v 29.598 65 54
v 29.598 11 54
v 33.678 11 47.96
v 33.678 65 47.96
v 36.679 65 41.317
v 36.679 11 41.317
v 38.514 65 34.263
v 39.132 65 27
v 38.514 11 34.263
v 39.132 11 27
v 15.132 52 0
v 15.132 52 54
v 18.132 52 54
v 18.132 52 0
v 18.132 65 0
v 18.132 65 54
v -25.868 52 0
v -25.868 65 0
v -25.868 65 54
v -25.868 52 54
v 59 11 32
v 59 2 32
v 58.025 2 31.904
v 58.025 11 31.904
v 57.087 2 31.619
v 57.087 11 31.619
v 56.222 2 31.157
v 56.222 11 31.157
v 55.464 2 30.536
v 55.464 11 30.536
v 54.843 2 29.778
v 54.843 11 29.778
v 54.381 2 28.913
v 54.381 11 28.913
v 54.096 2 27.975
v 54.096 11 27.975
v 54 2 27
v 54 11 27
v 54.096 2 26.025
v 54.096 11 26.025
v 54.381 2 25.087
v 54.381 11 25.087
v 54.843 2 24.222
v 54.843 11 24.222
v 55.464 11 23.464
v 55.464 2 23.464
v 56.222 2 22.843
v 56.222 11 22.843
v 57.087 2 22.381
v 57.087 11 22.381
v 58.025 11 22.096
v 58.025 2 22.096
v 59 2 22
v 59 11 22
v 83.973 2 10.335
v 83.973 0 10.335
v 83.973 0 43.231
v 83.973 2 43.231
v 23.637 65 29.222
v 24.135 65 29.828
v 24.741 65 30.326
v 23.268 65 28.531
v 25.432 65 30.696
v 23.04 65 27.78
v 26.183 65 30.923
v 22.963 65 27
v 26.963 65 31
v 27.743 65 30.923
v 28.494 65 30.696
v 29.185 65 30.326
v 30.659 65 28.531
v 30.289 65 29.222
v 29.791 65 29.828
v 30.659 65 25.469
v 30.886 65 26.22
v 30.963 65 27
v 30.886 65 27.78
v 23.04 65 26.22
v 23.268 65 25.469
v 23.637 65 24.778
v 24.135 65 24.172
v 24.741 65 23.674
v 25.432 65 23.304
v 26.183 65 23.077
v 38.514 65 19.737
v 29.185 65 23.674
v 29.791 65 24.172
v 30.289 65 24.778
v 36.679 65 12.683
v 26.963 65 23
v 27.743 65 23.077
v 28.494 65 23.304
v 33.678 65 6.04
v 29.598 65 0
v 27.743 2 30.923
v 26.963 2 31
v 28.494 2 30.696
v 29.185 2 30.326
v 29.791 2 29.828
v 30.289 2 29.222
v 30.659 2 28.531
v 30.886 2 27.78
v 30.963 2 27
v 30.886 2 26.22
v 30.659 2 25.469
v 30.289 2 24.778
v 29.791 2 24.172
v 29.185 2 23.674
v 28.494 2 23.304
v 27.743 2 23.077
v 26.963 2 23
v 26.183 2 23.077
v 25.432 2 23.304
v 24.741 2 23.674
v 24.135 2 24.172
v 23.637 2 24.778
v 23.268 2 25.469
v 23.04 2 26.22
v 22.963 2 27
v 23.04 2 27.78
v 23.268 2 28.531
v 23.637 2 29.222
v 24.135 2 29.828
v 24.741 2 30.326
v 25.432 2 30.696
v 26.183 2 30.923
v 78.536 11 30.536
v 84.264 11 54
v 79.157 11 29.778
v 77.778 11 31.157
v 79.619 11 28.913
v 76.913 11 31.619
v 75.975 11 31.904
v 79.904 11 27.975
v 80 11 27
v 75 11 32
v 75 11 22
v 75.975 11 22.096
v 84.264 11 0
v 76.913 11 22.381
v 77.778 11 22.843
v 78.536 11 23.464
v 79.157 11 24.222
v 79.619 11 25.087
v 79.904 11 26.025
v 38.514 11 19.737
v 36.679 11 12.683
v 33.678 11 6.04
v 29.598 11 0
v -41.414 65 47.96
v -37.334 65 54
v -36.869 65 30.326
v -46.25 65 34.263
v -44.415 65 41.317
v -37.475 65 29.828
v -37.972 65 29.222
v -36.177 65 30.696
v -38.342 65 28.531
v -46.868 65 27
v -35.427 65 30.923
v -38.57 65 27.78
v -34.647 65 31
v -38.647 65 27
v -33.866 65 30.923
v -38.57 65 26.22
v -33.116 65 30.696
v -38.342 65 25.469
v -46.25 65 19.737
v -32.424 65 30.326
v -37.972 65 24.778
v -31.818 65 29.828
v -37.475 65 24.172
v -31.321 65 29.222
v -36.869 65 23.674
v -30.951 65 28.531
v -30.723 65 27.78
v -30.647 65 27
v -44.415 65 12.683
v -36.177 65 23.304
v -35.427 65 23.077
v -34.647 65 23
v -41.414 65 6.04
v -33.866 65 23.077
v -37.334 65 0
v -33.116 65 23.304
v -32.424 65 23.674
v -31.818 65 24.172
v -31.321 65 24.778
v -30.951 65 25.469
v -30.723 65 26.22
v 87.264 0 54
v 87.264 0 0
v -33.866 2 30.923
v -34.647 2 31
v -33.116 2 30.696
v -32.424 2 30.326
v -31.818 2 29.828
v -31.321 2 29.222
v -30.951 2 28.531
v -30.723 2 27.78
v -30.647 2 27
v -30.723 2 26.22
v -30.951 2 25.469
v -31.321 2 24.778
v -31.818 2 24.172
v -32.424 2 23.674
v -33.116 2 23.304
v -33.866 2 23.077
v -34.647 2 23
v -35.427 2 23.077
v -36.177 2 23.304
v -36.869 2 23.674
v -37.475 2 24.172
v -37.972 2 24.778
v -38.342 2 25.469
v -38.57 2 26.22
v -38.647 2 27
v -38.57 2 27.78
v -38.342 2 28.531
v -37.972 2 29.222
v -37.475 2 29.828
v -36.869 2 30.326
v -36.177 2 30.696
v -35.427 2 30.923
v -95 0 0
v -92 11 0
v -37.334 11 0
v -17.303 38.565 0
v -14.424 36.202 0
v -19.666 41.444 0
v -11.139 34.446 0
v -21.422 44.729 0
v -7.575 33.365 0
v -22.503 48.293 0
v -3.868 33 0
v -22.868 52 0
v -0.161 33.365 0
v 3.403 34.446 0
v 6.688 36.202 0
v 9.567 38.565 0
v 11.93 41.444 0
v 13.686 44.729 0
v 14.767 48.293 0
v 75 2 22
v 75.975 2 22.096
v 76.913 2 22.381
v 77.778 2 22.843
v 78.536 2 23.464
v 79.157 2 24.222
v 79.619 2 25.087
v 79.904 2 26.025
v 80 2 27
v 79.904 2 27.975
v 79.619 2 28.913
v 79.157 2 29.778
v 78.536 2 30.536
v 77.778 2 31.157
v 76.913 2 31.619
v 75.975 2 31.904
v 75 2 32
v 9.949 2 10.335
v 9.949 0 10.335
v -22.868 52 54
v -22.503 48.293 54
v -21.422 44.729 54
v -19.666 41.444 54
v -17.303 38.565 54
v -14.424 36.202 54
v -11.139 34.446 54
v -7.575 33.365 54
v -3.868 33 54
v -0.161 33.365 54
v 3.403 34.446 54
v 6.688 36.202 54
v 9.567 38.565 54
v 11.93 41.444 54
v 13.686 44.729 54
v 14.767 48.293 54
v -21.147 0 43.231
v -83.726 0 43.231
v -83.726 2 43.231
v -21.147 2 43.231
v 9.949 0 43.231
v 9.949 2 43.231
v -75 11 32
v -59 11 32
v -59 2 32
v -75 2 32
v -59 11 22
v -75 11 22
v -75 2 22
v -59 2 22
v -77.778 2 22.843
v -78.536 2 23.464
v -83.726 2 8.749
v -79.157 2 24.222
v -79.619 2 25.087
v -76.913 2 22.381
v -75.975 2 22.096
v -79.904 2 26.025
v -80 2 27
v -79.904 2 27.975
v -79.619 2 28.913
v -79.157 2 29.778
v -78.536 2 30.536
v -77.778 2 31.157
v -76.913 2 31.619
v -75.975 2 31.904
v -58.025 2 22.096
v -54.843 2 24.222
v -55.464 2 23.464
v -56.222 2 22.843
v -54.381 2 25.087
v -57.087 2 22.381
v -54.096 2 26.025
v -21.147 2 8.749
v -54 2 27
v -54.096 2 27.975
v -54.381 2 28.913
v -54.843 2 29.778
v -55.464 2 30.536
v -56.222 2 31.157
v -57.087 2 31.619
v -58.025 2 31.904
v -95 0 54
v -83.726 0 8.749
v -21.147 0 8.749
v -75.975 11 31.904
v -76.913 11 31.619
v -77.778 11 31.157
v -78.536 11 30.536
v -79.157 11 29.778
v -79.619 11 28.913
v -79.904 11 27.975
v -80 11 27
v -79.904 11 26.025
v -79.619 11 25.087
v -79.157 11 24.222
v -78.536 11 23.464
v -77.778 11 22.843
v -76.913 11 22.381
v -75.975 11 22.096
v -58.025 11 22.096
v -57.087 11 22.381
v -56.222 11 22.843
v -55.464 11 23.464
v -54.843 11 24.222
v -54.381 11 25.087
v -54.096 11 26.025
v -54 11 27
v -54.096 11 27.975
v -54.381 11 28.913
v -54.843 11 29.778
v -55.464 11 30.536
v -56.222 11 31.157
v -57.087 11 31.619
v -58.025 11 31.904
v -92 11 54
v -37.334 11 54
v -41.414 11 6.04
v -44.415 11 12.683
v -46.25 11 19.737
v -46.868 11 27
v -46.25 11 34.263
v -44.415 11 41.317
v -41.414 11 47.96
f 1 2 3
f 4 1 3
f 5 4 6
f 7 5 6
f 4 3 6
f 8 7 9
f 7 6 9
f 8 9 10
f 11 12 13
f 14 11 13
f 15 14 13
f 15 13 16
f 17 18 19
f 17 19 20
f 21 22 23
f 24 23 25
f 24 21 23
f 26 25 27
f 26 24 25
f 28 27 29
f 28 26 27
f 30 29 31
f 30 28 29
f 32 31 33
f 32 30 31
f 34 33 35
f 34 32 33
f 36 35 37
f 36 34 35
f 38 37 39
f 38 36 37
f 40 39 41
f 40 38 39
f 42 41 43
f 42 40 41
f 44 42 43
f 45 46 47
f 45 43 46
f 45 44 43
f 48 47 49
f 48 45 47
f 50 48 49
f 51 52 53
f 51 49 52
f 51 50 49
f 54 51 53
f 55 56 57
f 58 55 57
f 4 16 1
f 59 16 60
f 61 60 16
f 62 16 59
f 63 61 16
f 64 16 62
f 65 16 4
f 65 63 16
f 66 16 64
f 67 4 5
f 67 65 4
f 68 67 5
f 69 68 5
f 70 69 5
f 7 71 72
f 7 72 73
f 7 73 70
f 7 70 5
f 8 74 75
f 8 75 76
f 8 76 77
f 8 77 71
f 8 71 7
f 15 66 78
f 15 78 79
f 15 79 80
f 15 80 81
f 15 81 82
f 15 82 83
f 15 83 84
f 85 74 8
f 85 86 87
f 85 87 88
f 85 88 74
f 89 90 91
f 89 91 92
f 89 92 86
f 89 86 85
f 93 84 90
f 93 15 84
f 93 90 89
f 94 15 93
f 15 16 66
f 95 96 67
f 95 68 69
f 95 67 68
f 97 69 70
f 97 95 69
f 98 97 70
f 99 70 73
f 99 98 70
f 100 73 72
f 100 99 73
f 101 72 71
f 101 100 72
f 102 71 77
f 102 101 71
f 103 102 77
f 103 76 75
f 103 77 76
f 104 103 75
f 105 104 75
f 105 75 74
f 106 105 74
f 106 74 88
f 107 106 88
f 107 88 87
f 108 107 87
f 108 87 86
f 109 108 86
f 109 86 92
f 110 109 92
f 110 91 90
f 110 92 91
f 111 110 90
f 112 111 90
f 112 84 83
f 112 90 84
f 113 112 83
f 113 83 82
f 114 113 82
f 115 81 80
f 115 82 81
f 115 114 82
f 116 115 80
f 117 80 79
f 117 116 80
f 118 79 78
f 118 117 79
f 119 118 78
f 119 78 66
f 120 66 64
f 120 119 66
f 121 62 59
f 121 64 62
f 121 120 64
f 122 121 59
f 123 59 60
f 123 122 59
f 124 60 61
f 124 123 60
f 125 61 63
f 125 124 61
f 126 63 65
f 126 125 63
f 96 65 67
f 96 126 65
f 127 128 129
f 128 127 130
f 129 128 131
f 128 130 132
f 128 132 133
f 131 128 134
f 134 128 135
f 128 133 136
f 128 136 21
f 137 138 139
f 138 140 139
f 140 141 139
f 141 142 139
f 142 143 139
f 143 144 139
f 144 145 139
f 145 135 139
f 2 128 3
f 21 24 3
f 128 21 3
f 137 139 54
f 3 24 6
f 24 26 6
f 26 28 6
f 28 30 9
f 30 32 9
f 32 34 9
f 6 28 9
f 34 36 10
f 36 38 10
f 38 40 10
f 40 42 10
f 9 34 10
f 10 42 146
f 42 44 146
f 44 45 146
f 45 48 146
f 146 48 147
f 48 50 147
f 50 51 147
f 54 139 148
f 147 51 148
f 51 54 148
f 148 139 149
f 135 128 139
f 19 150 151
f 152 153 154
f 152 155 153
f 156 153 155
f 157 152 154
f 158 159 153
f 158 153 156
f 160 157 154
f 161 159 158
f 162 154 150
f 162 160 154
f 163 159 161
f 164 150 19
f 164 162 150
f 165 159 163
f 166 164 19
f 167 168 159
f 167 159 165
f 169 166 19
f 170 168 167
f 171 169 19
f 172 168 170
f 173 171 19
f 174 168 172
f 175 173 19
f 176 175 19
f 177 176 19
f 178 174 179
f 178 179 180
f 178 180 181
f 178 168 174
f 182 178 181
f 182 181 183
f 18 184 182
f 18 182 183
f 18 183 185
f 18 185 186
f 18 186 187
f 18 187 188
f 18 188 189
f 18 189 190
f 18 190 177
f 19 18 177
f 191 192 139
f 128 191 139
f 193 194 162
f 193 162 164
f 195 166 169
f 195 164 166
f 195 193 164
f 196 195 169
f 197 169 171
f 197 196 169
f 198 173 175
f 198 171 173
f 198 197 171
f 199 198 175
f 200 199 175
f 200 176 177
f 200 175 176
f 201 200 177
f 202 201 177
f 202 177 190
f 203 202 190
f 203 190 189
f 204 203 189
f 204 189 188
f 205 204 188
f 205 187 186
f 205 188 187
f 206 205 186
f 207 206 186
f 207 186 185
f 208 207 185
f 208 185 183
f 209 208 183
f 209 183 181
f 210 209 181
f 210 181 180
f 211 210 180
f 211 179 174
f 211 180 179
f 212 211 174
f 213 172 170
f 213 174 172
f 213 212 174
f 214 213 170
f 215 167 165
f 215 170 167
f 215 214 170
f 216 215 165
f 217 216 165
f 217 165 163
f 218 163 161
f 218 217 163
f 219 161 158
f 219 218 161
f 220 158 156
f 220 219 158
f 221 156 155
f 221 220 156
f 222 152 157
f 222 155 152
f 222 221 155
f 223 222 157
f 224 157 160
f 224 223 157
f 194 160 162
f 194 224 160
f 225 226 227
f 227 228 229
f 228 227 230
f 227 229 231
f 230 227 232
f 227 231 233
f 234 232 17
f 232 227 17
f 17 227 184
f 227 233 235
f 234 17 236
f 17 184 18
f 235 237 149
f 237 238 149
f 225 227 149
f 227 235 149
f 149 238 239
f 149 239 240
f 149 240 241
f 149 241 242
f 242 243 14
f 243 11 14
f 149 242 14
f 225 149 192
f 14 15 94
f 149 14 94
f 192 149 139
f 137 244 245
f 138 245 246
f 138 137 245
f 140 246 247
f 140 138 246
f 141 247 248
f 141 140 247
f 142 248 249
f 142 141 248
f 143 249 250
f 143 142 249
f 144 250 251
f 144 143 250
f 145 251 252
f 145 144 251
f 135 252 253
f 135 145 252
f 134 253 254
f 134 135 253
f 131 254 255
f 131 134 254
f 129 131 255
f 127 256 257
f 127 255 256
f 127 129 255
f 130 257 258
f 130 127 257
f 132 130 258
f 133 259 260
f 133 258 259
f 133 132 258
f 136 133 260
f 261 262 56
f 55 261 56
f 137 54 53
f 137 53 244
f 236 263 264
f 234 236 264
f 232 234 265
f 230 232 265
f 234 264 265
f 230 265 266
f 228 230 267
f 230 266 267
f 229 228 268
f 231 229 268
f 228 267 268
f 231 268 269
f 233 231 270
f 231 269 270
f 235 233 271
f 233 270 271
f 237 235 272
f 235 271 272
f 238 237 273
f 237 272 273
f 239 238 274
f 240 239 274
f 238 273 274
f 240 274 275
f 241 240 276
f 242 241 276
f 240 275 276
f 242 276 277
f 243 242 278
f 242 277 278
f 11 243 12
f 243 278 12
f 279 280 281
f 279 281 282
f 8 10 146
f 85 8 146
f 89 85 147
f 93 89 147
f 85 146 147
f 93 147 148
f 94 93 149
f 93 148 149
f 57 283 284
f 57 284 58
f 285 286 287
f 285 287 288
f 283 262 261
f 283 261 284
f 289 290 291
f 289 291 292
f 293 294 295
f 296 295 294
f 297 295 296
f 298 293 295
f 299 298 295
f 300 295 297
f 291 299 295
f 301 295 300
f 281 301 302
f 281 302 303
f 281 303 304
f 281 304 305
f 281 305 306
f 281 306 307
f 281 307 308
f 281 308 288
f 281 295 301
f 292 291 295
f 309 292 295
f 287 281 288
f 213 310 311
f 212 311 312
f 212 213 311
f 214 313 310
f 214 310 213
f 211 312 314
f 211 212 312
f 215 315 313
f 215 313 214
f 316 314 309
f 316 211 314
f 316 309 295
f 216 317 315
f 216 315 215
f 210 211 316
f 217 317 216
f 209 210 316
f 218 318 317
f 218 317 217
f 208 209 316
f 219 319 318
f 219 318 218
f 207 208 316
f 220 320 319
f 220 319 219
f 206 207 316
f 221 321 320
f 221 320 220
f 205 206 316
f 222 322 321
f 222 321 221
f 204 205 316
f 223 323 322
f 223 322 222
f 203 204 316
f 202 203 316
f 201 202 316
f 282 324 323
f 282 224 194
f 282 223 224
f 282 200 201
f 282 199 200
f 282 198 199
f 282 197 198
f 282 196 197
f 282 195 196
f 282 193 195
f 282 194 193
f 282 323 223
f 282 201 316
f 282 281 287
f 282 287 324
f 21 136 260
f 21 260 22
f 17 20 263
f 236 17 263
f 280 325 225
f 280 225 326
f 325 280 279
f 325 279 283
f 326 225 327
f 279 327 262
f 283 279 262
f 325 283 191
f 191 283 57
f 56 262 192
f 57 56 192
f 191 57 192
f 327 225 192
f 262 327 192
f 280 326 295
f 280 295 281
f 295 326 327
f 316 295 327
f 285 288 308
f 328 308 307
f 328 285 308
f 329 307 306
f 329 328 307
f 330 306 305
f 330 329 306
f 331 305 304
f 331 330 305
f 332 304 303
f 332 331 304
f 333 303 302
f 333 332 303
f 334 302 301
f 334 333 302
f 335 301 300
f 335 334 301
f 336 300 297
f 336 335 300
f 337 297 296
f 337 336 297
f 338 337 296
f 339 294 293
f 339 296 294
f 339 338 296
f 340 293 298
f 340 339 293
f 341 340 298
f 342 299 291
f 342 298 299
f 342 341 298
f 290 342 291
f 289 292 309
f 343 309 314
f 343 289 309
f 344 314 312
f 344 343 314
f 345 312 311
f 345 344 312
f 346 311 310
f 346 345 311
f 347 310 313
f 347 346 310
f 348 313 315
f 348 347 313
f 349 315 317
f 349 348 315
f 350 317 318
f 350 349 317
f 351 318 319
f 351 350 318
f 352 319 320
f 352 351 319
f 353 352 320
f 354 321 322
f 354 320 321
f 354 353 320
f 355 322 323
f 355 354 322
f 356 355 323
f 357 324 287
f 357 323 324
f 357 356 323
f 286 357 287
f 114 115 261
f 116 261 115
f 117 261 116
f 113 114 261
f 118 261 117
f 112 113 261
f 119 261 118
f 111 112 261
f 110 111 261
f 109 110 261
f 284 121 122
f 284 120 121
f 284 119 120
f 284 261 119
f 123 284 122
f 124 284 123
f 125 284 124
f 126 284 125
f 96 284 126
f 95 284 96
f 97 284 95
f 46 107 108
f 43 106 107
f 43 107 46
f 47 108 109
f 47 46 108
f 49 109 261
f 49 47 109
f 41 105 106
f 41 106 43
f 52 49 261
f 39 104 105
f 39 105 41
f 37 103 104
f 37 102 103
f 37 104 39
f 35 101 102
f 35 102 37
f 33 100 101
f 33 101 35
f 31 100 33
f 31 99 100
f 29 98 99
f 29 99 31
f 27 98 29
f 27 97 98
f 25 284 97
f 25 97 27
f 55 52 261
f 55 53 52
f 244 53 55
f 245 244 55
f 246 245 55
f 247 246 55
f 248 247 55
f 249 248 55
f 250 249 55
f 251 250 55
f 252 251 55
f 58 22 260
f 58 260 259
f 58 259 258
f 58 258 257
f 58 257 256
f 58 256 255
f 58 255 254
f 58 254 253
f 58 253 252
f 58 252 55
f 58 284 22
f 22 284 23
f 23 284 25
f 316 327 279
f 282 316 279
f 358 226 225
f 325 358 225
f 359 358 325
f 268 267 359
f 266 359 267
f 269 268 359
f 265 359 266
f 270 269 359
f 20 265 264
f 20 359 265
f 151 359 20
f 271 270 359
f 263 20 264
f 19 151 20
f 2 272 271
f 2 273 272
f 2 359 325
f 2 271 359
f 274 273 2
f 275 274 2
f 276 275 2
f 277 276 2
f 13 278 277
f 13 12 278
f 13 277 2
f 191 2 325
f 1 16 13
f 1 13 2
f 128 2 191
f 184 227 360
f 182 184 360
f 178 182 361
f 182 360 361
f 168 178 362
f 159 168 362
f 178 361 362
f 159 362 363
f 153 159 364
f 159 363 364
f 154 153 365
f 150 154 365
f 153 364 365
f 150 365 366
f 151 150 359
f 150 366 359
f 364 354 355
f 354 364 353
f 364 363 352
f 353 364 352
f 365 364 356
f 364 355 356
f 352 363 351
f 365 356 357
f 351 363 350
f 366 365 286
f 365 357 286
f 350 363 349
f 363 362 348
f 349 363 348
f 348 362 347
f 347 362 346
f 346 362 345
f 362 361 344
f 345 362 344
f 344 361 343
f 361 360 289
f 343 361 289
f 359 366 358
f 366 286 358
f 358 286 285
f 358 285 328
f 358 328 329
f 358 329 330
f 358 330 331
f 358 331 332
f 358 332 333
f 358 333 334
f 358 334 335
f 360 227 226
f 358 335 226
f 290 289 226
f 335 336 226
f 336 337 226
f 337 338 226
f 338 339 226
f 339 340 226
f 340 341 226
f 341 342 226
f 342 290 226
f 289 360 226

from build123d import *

# Parameters (mm, degrees)
BOSS_EXTRUDE1_DEPTH      = 54
BOSS_EXTRUDE2_DEPTH      = 54
CUT_EXTRUDE4_DEPTH       = 79.958686857
CUT_EXTRUDE8_DEPTH       = 120
CUT_EXTRUDE8_DEPTH_BACK  = 57
SKETCH4_R                = 4
CUT_EXTRUDE10_DEPTH      = 155
CUT_EXTRUDE10_DEPTH_BACK = 93
SKETCH5_R                = 4
CUT_EXTRUDE11_DEPTH      = 155
SKETCH7_W                = 62.578276035
SKETCH7_H                = 34.481752036
SKETCH7_W_2              = 74.024148658
SKETCH7_H_2              = 32.895468992
CUT_EXTRUDE12_DEPTH      = 2


with BuildPart() as part:
    # Sketch1 → Boss-Extrude1 (new body)
    with BuildSketch(Plane.XY):
        Polygon((-95, 0), (87.264140028, 0), (84.264140028, 11), (-92, 11), align=None)
    extrude(amount=BOSS_EXTRUDE1_DEPTH)

    # Sketch2 → Boss-Extrude2 (add)
    with BuildSketch(Plane(origin=(0, 11, 0), x_dir=(1, 0, 0), z_dir=(0, 1, 0))):
        with BuildLine():
            Line((-37.334331048, -54), (29.598471075, -54))
            ThreePointArc((29.598471075, -54), (36.678680511, -41.3168564), (39.132070014, -27))
            ThreePointArc((39.132070014, -27), (36.678680511, -12.6831436), (29.598471075, 0))
            Line((29.598471075, 0), (-37.334331048, 0))
            ThreePointArc((-37.334331048, 0), (-46.867929986, -27), (-37.334331048, -54))
        make_face()
    extrude(amount=BOSS_EXTRUDE2_DEPTH)

    # Sketch3 → Cut-Extrude4 (cut, symmetric)
    with BuildSketch(Plane.XY):
        with BuildLine():
            Line((15.132070014, 52), (18.132070014, 52))
            Line((18.132070014, 52), (18.132070014, 65))
            Line((18.132070014, 65), (-25.867929986, 65))
            Line((-25.867929986, 65), (-25.867929986, 52))
            Line((-25.867929986, 52), (-22.867929986, 52))
            ThreePointArc((-22.867929986, 52), (-3.867929986, 33), (15.132070014, 52))
        make_face()
    extrude(amount=CUT_EXTRUDE4_DEPTH, both=True, mode=Mode.SUBTRACT)

    # Sketch4 → Cut-Extrude8 (cut, two sides: drawn at the far end of the back side and taken through both)
    with BuildSketch(Plane(origin=(0, 0, 0), x_dir=(1, 0, 0), z_dir=(0, 1, 0)).offset(-CUT_EXTRUDE8_DEPTH_BACK)):
        with Locations(Location((-34.646506606, -27, 0), (0, 0, 270))):
            Circle(SKETCH4_R)
    extrude(amount=CUT_EXTRUDE8_DEPTH + CUT_EXTRUDE8_DEPTH_BACK, mode=Mode.SUBTRACT)

    # Sketch5 → Cut-Extrude10 (cut, two sides: drawn at the far end of the back side and taken through both)
    with BuildSketch(Plane(origin=(0, 0, 0), x_dir=(1, 0, 0), z_dir=(0, 1, 0)).offset(-CUT_EXTRUDE10_DEPTH_BACK)):
        with Locations(Location((26.963039677, -27, 0), (0, 0, 270))):
            Circle(SKETCH5_R)
    extrude(amount=CUT_EXTRUDE10_DEPTH + CUT_EXTRUDE10_DEPTH_BACK, mode=Mode.SUBTRACT)

    # Sketch6 → Cut-Extrude11 (cut)
    with BuildSketch(Plane(origin=(0, 11, 0), x_dir=(1, 0, 0), z_dir=(0, 1, 0))):
        with BuildLine():
            Line((75, -32), (59, -32))
            ThreePointArc((59, -32), (54, -27), (59, -22))
            Line((59, -22), (75, -22))
            ThreePointArc((75, -22), (80, -27), (75, -32))
        make_face()
        with BuildLine():
            Line((-59, -32), (-75, -32))
            ThreePointArc((-75, -32), (-80, -27), (-75, -22))
            Line((-75, -22), (-59, -22))
            ThreePointArc((-59, -22), (-54, -27), (-59, -32))
        make_face()
    extrude(amount=-CUT_EXTRUDE11_DEPTH, mode=Mode.SUBTRACT)

    # Sketch7 → Cut-Extrude12 (cut)
    with BuildSketch(Plane.XZ):
        with Locations((-52.436526345, 25.989630072)):
            Rectangle(SKETCH7_W, SKETCH7_H)
        with Locations((46.961370867, 26.782771594)):
            Rectangle(SKETCH7_W_2, SKETCH7_H_2)
    extrude(amount=-CUT_EXTRUDE12_DEPTH, mode=Mode.SUBTRACT)


solid = part.part
